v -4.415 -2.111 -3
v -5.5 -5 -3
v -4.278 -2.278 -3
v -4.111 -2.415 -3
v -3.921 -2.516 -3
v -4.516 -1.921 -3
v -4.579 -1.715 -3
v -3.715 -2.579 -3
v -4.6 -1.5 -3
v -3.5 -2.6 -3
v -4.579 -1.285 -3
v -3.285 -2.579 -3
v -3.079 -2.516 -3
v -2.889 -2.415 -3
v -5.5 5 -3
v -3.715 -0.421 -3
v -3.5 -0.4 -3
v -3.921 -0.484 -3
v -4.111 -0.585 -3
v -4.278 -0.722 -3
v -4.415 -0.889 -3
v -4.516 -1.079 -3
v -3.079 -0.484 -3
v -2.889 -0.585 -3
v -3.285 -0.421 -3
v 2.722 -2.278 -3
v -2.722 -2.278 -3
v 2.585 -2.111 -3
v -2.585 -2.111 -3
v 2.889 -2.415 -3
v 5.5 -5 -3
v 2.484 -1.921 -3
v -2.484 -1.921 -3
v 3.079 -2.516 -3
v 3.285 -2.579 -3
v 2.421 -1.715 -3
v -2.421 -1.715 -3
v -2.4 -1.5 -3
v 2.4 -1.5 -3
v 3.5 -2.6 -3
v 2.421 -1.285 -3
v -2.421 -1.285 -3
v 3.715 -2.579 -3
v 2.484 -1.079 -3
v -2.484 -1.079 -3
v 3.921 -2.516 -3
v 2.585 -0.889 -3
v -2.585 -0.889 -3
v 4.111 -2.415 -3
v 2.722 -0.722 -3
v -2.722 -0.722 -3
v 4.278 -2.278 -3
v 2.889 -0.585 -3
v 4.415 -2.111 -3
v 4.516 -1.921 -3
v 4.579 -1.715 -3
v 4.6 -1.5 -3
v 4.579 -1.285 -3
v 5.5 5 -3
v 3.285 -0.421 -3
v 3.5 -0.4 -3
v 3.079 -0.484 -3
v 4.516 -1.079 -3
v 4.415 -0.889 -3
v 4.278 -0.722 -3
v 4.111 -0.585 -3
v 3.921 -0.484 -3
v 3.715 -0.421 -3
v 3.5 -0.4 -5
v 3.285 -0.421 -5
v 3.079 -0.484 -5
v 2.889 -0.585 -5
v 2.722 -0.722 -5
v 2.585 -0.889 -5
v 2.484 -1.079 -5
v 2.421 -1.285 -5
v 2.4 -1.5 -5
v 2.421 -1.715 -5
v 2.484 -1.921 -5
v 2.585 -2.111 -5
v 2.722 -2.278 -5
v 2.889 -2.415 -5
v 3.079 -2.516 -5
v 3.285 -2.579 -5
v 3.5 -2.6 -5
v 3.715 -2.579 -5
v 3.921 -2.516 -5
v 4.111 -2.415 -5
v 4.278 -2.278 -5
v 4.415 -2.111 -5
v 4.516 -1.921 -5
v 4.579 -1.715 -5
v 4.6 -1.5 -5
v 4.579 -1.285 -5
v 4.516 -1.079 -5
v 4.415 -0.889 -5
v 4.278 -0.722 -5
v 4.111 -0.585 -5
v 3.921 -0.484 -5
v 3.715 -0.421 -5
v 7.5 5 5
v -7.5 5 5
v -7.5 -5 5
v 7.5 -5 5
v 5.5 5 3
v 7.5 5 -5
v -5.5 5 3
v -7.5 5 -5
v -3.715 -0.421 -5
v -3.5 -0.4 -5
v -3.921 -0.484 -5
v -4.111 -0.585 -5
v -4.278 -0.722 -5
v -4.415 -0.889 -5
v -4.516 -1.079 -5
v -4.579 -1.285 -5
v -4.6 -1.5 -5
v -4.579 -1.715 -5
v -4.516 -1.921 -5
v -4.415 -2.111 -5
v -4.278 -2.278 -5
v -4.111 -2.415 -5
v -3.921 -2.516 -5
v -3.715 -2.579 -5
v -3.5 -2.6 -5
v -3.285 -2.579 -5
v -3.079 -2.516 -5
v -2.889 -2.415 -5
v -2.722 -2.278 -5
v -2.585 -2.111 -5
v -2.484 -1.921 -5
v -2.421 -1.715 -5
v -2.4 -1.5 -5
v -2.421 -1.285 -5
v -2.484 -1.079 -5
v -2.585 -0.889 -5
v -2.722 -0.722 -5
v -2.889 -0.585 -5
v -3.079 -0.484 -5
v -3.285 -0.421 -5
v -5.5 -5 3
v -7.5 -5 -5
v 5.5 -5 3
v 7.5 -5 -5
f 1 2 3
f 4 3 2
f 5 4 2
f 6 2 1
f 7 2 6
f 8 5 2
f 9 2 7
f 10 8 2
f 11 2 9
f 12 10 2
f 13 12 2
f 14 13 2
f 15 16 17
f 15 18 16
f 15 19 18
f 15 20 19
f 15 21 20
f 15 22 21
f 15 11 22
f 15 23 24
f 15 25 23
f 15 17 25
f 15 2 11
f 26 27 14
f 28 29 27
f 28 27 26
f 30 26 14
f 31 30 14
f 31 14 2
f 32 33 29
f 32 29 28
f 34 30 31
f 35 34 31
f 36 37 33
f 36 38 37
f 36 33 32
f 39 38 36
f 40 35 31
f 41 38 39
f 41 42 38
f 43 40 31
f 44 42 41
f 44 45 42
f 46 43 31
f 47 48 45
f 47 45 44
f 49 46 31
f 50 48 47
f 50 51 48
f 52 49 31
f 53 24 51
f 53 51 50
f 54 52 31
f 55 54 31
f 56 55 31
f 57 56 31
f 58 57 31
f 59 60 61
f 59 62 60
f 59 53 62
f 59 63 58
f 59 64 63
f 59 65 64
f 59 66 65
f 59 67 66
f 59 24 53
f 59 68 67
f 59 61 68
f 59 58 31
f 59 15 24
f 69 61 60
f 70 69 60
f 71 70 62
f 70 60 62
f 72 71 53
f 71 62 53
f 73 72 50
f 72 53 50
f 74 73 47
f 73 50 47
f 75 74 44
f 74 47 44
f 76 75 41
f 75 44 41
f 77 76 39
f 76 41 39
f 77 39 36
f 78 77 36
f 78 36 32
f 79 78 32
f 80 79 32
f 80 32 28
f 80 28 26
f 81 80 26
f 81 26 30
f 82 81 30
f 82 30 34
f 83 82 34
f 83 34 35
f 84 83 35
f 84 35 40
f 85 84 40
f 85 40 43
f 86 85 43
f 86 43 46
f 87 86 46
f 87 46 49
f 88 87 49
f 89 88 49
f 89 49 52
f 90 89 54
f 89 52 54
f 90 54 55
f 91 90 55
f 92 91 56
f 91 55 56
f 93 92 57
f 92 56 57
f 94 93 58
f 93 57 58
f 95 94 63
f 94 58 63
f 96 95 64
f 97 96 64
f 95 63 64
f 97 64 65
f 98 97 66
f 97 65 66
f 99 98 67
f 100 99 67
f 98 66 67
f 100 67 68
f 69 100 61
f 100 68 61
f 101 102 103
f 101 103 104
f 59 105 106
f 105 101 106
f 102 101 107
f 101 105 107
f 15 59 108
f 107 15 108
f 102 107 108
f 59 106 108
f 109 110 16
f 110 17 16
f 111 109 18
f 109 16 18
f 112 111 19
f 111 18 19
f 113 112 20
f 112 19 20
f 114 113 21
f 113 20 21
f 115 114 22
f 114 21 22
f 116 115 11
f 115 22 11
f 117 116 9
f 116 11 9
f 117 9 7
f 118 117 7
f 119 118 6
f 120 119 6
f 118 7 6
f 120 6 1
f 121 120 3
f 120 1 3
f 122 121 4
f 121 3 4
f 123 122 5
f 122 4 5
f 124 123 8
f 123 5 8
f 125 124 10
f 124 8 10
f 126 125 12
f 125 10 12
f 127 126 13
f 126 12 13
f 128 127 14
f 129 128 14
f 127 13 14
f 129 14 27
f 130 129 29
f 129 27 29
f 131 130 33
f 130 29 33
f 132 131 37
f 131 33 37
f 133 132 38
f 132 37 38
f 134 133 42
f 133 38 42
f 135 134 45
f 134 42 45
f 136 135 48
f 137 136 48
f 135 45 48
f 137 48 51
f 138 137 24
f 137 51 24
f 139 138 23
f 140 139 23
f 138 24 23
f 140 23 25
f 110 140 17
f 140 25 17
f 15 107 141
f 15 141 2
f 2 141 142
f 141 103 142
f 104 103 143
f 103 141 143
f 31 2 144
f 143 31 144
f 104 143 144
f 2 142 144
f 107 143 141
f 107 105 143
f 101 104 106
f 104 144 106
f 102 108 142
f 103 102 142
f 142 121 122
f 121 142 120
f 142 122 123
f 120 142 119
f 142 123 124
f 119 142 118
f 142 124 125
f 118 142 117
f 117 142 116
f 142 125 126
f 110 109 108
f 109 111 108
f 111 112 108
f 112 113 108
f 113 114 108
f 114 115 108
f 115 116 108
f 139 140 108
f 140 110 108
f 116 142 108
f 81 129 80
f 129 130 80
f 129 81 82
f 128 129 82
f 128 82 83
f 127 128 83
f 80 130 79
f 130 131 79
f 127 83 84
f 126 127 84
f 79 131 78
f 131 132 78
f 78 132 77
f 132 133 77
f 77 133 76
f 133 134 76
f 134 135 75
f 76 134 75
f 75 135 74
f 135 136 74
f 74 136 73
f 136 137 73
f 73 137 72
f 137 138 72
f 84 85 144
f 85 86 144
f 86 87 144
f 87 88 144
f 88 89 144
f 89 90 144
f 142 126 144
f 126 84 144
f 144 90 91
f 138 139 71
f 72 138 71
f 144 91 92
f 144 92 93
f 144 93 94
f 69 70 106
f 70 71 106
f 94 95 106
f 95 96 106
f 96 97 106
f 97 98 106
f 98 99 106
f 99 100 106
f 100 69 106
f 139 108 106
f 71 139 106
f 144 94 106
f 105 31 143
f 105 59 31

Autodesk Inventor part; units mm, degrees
ref_plane "YZ Plane" through (0, 0, 0) normal (1, 0, 0) x (0, 1, 0)
ref_plane "XZ Plane" through (0, 0, 0) normal (0, 1, 0) x (-1, 0, 0)
ref_plane "XY Plane" through (0, 0, 0) normal (0, 0, 1) x (1, 0, 0)
sketch "スケッチ1" plane through (0, 0, 0) normal (0, 0, 1) x (1, 0, 0)
  line L0 (-7.5, -5) -> (7.5, -5)
  line L1 (7.5, -5) -> (7.5, 5)
  line L2 (7.5, 5) -> (-7.5, 5)
  line L3 (-7.5, 5) -> (-7.5, -5)
  line L4 (-7.5, -5) -> (7.5, 5) construction
  line L5 (7.5, -5) -> (-7.5, 5) construction
  point P0 (0, 0)
  dimension "d0" = 15
  dimension "d1" = 10
extrude "押し出し1" add sketch "スケッチ1" along normal mid plane 10
sketch "スケッチ2" plane through (-7.5, 5, 5) normal (0, 1, 0) x (1, 0, 0)
  line L0 (13, 2) -> (2, 2)
  line L1 (2, 2) -> (2, 8)
  line L2 (2, 8) -> (13, 8)
  line L3 (13, 8) -> (13, 2)
  line L4 (13, 2) -> (2, 8) construction
  line L5 (2, 2) -> (13, 8) construction
  point P0 (7.5, 5)
  dimension "d4" = 6
  dimension "d5" = 11
extrude "押し出し2" cut sketch "スケッチ2" against normal blind 10
sketch "スケッチ3" plane through (0, 0, -5) normal (0, 0, -1) x (-1, 0, 0)
  line L0 (-7.5, -5) -> (7.5, -5) projected
  line L1 (-7.5, 5) -> (-7.5, -5) projected
  line L2 (7.5, -5) -> (7.5, 5) projected
  point P0 (0, 0)
  point P1 (-3.5, -1.5)
  point P2 (3.5, -1.5)
  dimension "d8" = 3.5
  dimension "d9" = 4
  dimension "d10" = 4
  dimension "d11" = 3.5
hole "穴1" at (3.5, -1.5, -5) at (-3.5, -1.5, -5) direction (0, 0, 1) diameter 2.2 depth 4 tip angle 118
equation "\"d10\" = d9"
equation "\"d11\" = d8"
properties part number "sponge"
